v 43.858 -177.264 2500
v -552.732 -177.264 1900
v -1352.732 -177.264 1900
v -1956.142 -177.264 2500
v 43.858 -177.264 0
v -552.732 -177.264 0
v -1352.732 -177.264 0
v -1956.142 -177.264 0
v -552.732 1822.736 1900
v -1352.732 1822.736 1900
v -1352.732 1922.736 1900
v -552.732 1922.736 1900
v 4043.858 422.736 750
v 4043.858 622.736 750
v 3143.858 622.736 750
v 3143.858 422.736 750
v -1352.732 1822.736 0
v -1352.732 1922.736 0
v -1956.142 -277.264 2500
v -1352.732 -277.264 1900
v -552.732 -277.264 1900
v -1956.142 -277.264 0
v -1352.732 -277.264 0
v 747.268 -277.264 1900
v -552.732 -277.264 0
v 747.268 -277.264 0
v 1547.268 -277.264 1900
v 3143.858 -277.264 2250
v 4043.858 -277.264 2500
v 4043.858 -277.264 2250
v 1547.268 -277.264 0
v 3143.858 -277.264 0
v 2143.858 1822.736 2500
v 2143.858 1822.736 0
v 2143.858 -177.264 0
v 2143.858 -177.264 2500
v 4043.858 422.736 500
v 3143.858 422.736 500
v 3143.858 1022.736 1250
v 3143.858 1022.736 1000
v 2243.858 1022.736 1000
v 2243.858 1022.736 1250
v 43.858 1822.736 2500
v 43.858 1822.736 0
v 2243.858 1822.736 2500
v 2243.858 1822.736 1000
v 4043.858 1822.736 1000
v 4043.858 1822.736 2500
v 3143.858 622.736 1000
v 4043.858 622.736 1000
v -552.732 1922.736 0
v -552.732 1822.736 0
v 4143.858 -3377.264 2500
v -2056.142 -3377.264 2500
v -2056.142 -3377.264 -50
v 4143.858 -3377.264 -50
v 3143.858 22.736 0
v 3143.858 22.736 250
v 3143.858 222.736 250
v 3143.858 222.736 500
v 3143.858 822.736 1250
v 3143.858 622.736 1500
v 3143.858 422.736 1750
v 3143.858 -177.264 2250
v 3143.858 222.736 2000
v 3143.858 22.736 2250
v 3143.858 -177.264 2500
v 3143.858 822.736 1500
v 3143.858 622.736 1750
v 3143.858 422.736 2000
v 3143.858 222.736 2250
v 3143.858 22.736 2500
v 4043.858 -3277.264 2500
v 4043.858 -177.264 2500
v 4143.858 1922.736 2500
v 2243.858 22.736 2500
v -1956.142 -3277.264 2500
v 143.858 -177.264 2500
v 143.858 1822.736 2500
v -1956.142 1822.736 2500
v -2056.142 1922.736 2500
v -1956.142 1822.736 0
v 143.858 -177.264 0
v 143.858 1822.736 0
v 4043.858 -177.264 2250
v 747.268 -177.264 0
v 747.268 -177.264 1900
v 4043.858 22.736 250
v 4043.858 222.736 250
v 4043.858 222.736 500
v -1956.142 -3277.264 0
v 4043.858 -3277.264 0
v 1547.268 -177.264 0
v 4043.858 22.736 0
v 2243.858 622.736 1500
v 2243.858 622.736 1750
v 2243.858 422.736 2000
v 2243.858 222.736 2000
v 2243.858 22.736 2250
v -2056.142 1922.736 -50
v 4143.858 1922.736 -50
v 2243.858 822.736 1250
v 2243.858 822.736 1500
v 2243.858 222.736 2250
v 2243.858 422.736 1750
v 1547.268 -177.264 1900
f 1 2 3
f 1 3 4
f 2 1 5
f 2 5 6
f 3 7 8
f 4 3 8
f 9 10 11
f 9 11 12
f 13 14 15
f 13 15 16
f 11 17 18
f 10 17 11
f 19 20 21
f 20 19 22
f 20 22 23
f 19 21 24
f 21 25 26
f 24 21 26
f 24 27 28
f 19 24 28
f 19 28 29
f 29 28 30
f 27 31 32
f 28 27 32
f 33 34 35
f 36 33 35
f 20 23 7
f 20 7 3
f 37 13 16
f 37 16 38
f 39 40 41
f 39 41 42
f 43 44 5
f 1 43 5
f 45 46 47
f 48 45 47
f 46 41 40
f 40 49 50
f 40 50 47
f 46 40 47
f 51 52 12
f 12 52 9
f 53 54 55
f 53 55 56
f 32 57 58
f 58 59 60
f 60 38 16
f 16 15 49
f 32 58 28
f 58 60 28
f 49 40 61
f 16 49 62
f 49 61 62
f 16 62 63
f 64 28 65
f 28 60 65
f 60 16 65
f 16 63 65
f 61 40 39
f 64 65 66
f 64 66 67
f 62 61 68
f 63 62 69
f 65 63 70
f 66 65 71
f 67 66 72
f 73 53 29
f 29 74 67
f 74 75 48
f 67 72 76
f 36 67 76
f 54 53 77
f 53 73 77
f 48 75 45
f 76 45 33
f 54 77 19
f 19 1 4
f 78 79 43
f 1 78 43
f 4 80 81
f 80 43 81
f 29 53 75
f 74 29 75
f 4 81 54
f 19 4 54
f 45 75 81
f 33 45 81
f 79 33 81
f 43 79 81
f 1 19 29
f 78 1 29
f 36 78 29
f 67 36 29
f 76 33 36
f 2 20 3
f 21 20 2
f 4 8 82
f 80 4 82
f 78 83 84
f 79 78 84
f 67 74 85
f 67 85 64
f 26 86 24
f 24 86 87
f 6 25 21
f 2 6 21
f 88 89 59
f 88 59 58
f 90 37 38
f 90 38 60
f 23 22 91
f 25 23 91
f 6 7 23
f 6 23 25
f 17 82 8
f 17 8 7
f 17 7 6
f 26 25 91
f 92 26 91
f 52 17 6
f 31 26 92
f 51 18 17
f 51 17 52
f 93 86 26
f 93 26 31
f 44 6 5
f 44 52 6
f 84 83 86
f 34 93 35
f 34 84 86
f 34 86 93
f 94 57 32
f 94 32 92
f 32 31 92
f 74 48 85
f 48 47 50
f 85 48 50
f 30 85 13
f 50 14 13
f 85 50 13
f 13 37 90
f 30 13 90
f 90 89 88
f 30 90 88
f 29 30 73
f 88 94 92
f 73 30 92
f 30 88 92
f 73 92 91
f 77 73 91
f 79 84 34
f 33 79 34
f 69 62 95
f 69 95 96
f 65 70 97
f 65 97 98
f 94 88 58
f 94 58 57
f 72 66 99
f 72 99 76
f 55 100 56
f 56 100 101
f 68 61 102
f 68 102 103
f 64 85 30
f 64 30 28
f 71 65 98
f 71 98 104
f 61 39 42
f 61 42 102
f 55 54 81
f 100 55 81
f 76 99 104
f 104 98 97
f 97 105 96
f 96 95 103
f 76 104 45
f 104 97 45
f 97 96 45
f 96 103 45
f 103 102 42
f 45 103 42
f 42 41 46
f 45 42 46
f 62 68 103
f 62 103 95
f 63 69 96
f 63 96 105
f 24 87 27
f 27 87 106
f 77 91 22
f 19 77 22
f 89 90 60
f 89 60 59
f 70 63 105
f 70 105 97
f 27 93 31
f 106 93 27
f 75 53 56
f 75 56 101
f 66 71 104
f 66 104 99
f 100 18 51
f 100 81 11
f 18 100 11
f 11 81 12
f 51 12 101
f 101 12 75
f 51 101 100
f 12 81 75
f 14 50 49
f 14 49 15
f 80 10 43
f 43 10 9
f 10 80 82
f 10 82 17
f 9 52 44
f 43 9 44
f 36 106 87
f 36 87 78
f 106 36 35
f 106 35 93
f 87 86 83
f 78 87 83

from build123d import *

# Parameters (mm, degrees)
F0_W      = 100
F0_H      = 100
F0_H_2    = 2000
F0_W_2    = 900
F1_DEPTH  = 2500
F2_W      = 800
F2_H      = 1900
F3_DEPTH  = 2070
F4_DEPTH  = 1630
F6_W      = 6200
F6_H      = 5300
F7_DEPTH  = 50
F9_DEPTH  = 1000
F10_DEPTH = 1900
F8_W      = 200
F8_H      = 250
F11_DEPTH = 1900
F12_DEPTH = 1000
F13_DEPTH = 1480
F14_DEPTH = 1000
F15_DEPTH = 100
F16_W     = 900
F16_H     = 166.3858890533
F16_H_2   = 83.6141109467
F17_DEPTH = 200


with BuildPart() as f1:
    # F0 (on Top) → F1 (new body)
    with BuildSketch(Plane.XY):
        Polygon((-1956.1421014369, 1922.7362155914), (-1956.1421014369, 1822.7362155914), (43.8578985631, 1822.7362155914), (43.8578985631, -177.2637844086), (143.8578985631, -177.2637844086), (143.8578985631, 1822.7362155914), (143.8578985631, 1922.7362155914), align=None)
        with Locations((-2006.1421014369, 1872.7362155914)):
            Rectangle(F0_W, F0_H)
        Polygon((2143.8578985631, -177.2637844086), (143.8578985631, -177.2637844086), (143.8578985631, -277.2637844086), (2243.8578985631, -277.2637844086), (2243.8578985631, -177.2637844086), align=None)
        Polygon((2243.8578985631, 1922.7362155914), (143.8578985631, 1922.7362155914), (143.8578985631, 1822.7362155914), (2143.8578985631, 1822.7362155914), (2143.8578985631, -177.2637844086), (2243.8578985631, -177.2637844086), (2243.8578985631, 1822.7362155914), align=None)
        with Locations((-2006.1421014369, 822.7362155914)):
            Rectangle(F0_W, F0_H_2)
        Polygon((43.8578985631, -177.2637844086), (-1956.1421014369, -177.2637844086), (-2056.1421014369, -177.2637844086), (-2056.1421014369, -277.2637844086), (-1956.1421014369, -277.2637844086), (143.8578985631, -277.2637844086), (143.8578985631, -177.2637844086), align=None)
        Polygon((-1956.1421014369, -277.2637844086), (-2056.1421014369, -277.2637844086), (-2056.1421014369, -3377.2637844086), (4143.8578985631, -3377.2637844086), (4143.8578985631, -177.2637844086), (4043.8578985631, -177.2637844086), (4043.8578985631, -277.2637844086), (4043.8578985631, -3277.2637844086), (-1956.1421014369, -3277.2637844086), align=None)
        with Locations((2693.8578985631, 1872.7362155914)):
            Rectangle(F0_W_2, F0_H)
        Polygon((4143.8578985631, 1922.7362155914), (3143.8578985631, 1922.7362155914), (3143.8578985631, 1822.7362155914), (4043.8578985631, 1822.7362155914), (4043.8578985631, -177.2637844086), (4143.8578985631, -177.2637844086), align=None)
    extrude(amount=F1_DEPTH)

    # F2 (on Front) → F3 (cut, symmetric)
    with BuildSketch(Plane.XZ):
        with Locations((-952.7319908142, 950)):
            Rectangle(F2_W, F2_H)
    extrude(amount=F3_DEPTH, both=True, mode=Mode.SUBTRACT)

    # F2 (on Front) → F4 (cut)
    with BuildSketch(Plane.XZ):
        with Locations((1147.2680091858, 950)):
            Rectangle(F2_W, F2_H)
    extrude(amount=F4_DEPTH, mode=Mode.SUBTRACT)

    # F6 (on face) → F7 (join)
    with BuildSketch(Plane.XY):
        with Locations((1043.8578985631, -727.2637844086)):
            Rectangle(F6_W, F6_H)
    extrude(amount=-F7_DEPTH)

    # F8 (on offset) → F9 (join)
    with BuildSketch(Plane.YZ.offset(4143.8578985631)):
        Polygon((22.7362155914, 0), (1822.7362155914, 0), (1822.7362155914, 250), (222.7362155914, 250), (22.7362155914, 250), align=None)
        Polygon((222.7362155914, 250), (1822.7362155914, 250), (1822.7362155914, 500), (422.7362155914, 500), (222.7362155914, 500), align=None)
        Polygon((422.7362155914, 500), (1822.7362155914, 500), (1822.7362155914, 750), (622.7362155914, 750), (422.7362155914, 750), align=None)
    extrude(amount=-F9_DEPTH)

    # F8 (on offset) → F10 (join)
    with BuildSketch(Plane.YZ.offset(4143.8578985631)):
        Polygon((622.7362155914, 750), (1822.7362155914, 750), (1822.7362155914, 1000), (1022.7362155914, 1000), (622.7362155914, 1000), align=None)
    extrude(amount=-F10_DEPTH)

    # F8 (on offset) → F11 (join)
    with BuildSketch(Plane.YZ.offset(4143.8578985631)):
        with Locations((-77.2637844086, 2375)):
            Rectangle(F8_W, F8_H)
        Polygon((-177.2637844086, 2250), (-177.2637844086, 2000), (222.7362155914, 2000), (222.7362155914, 2250), (22.7362155914, 2250), align=None)
        Polygon((-177.2637844086, 2000), (-177.2637844086, 1750), (422.7362155914, 1750), (422.7362155914, 2000), (222.7362155914, 2000), align=None)
        Polygon((-177.2637844086, 1750), (-177.2637844086, 1500), (622.7362155914, 1500), (622.7362155914, 1750), (422.7362155914, 1750), align=None)
        Polygon((-177.2637844086, 1500), (-177.2637844086, 1250), (822.7362155914, 1250), (822.7362155914, 1500), (622.7362155914, 1500), align=None)
        Polygon((-177.2637844086, 1250), (-177.2637844086, 1000), (622.7362155914, 1000), (1022.7362155914, 1000), (1022.7362155914, 1250), (822.7362155914, 1250), align=None)
    extrude(amount=-F11_DEPTH)

    # F8 (on offset) → F12 (cut)
    with BuildSketch(Plane.YZ.offset(4143.8578985631)):
        Polygon((-177.2637844086, 2250), (-177.2637844086, 2000), (222.7362155914, 2000), (222.7362155914, 2250), (22.7362155914, 2250), align=None)
        Polygon((-177.2637844086, 2000), (-177.2637844086, 1750), (422.7362155914, 1750), (422.7362155914, 2000), (222.7362155914, 2000), align=None)
        Polygon((-177.2637844086, 1750), (-177.2637844086, 1500), (622.7362155914, 1500), (622.7362155914, 1750), (422.7362155914, 1750), align=None)
        Polygon((-177.2637844086, 1500), (-177.2637844086, 1250), (822.7362155914, 1250), (822.7362155914, 1500), (622.7362155914, 1500), align=None)
        Polygon((-177.2637844086, 1250), (-177.2637844086, 1000), (622.7362155914, 1000), (1022.7362155914, 1000), (1022.7362155914, 1250), (822.7362155914, 1250), align=None)
    extrude(amount=-F12_DEPTH, mode=Mode.SUBTRACT)

    # F13 (add): a face of the model
    f13_faces = [f1.faces().sort_by_distance(p)[0] for p in [
        (4093.8578985631, -177.2637844086, 1625),
    ]]
    extrude(f13_faces, amount=F13_DEPTH)

    # F0 (on Top) → F14 (join)
    with BuildSketch(Plane.XY):
        with Locations((2693.8578985631, 822.7362155914)):
            Rectangle(F0_W_2, F0_H_2)
    extrude(amount=F14_DEPTH)

    # F15 (add): a face of the model
    f15_faces = [f1.faces().sort_by_distance(p)[0] for p in [
        (2775.6760803813, -177.2637844086, 1352.2727272727),
    ]]
    extrude(f15_faces, amount=F15_DEPTH)

    # F16 (on face) → F17 (cut)
    with BuildSketch(Plane(origin=(0, 22.7362155914, 0), x_dir=(-1, 0, 0), z_dir=(0, 1, 0))):
        with Locations((-3593.8578985631, 2416.8070554733)):
            Rectangle(F16_W, F16_H)
        with Locations((-3593.8578985631, 2291.8070554733)):
            Rectangle(F16_W, F16_H_2)
    extrude(amount=-F17_DEPTH, mode=Mode.SUBTRACT)


solid = f1.part
